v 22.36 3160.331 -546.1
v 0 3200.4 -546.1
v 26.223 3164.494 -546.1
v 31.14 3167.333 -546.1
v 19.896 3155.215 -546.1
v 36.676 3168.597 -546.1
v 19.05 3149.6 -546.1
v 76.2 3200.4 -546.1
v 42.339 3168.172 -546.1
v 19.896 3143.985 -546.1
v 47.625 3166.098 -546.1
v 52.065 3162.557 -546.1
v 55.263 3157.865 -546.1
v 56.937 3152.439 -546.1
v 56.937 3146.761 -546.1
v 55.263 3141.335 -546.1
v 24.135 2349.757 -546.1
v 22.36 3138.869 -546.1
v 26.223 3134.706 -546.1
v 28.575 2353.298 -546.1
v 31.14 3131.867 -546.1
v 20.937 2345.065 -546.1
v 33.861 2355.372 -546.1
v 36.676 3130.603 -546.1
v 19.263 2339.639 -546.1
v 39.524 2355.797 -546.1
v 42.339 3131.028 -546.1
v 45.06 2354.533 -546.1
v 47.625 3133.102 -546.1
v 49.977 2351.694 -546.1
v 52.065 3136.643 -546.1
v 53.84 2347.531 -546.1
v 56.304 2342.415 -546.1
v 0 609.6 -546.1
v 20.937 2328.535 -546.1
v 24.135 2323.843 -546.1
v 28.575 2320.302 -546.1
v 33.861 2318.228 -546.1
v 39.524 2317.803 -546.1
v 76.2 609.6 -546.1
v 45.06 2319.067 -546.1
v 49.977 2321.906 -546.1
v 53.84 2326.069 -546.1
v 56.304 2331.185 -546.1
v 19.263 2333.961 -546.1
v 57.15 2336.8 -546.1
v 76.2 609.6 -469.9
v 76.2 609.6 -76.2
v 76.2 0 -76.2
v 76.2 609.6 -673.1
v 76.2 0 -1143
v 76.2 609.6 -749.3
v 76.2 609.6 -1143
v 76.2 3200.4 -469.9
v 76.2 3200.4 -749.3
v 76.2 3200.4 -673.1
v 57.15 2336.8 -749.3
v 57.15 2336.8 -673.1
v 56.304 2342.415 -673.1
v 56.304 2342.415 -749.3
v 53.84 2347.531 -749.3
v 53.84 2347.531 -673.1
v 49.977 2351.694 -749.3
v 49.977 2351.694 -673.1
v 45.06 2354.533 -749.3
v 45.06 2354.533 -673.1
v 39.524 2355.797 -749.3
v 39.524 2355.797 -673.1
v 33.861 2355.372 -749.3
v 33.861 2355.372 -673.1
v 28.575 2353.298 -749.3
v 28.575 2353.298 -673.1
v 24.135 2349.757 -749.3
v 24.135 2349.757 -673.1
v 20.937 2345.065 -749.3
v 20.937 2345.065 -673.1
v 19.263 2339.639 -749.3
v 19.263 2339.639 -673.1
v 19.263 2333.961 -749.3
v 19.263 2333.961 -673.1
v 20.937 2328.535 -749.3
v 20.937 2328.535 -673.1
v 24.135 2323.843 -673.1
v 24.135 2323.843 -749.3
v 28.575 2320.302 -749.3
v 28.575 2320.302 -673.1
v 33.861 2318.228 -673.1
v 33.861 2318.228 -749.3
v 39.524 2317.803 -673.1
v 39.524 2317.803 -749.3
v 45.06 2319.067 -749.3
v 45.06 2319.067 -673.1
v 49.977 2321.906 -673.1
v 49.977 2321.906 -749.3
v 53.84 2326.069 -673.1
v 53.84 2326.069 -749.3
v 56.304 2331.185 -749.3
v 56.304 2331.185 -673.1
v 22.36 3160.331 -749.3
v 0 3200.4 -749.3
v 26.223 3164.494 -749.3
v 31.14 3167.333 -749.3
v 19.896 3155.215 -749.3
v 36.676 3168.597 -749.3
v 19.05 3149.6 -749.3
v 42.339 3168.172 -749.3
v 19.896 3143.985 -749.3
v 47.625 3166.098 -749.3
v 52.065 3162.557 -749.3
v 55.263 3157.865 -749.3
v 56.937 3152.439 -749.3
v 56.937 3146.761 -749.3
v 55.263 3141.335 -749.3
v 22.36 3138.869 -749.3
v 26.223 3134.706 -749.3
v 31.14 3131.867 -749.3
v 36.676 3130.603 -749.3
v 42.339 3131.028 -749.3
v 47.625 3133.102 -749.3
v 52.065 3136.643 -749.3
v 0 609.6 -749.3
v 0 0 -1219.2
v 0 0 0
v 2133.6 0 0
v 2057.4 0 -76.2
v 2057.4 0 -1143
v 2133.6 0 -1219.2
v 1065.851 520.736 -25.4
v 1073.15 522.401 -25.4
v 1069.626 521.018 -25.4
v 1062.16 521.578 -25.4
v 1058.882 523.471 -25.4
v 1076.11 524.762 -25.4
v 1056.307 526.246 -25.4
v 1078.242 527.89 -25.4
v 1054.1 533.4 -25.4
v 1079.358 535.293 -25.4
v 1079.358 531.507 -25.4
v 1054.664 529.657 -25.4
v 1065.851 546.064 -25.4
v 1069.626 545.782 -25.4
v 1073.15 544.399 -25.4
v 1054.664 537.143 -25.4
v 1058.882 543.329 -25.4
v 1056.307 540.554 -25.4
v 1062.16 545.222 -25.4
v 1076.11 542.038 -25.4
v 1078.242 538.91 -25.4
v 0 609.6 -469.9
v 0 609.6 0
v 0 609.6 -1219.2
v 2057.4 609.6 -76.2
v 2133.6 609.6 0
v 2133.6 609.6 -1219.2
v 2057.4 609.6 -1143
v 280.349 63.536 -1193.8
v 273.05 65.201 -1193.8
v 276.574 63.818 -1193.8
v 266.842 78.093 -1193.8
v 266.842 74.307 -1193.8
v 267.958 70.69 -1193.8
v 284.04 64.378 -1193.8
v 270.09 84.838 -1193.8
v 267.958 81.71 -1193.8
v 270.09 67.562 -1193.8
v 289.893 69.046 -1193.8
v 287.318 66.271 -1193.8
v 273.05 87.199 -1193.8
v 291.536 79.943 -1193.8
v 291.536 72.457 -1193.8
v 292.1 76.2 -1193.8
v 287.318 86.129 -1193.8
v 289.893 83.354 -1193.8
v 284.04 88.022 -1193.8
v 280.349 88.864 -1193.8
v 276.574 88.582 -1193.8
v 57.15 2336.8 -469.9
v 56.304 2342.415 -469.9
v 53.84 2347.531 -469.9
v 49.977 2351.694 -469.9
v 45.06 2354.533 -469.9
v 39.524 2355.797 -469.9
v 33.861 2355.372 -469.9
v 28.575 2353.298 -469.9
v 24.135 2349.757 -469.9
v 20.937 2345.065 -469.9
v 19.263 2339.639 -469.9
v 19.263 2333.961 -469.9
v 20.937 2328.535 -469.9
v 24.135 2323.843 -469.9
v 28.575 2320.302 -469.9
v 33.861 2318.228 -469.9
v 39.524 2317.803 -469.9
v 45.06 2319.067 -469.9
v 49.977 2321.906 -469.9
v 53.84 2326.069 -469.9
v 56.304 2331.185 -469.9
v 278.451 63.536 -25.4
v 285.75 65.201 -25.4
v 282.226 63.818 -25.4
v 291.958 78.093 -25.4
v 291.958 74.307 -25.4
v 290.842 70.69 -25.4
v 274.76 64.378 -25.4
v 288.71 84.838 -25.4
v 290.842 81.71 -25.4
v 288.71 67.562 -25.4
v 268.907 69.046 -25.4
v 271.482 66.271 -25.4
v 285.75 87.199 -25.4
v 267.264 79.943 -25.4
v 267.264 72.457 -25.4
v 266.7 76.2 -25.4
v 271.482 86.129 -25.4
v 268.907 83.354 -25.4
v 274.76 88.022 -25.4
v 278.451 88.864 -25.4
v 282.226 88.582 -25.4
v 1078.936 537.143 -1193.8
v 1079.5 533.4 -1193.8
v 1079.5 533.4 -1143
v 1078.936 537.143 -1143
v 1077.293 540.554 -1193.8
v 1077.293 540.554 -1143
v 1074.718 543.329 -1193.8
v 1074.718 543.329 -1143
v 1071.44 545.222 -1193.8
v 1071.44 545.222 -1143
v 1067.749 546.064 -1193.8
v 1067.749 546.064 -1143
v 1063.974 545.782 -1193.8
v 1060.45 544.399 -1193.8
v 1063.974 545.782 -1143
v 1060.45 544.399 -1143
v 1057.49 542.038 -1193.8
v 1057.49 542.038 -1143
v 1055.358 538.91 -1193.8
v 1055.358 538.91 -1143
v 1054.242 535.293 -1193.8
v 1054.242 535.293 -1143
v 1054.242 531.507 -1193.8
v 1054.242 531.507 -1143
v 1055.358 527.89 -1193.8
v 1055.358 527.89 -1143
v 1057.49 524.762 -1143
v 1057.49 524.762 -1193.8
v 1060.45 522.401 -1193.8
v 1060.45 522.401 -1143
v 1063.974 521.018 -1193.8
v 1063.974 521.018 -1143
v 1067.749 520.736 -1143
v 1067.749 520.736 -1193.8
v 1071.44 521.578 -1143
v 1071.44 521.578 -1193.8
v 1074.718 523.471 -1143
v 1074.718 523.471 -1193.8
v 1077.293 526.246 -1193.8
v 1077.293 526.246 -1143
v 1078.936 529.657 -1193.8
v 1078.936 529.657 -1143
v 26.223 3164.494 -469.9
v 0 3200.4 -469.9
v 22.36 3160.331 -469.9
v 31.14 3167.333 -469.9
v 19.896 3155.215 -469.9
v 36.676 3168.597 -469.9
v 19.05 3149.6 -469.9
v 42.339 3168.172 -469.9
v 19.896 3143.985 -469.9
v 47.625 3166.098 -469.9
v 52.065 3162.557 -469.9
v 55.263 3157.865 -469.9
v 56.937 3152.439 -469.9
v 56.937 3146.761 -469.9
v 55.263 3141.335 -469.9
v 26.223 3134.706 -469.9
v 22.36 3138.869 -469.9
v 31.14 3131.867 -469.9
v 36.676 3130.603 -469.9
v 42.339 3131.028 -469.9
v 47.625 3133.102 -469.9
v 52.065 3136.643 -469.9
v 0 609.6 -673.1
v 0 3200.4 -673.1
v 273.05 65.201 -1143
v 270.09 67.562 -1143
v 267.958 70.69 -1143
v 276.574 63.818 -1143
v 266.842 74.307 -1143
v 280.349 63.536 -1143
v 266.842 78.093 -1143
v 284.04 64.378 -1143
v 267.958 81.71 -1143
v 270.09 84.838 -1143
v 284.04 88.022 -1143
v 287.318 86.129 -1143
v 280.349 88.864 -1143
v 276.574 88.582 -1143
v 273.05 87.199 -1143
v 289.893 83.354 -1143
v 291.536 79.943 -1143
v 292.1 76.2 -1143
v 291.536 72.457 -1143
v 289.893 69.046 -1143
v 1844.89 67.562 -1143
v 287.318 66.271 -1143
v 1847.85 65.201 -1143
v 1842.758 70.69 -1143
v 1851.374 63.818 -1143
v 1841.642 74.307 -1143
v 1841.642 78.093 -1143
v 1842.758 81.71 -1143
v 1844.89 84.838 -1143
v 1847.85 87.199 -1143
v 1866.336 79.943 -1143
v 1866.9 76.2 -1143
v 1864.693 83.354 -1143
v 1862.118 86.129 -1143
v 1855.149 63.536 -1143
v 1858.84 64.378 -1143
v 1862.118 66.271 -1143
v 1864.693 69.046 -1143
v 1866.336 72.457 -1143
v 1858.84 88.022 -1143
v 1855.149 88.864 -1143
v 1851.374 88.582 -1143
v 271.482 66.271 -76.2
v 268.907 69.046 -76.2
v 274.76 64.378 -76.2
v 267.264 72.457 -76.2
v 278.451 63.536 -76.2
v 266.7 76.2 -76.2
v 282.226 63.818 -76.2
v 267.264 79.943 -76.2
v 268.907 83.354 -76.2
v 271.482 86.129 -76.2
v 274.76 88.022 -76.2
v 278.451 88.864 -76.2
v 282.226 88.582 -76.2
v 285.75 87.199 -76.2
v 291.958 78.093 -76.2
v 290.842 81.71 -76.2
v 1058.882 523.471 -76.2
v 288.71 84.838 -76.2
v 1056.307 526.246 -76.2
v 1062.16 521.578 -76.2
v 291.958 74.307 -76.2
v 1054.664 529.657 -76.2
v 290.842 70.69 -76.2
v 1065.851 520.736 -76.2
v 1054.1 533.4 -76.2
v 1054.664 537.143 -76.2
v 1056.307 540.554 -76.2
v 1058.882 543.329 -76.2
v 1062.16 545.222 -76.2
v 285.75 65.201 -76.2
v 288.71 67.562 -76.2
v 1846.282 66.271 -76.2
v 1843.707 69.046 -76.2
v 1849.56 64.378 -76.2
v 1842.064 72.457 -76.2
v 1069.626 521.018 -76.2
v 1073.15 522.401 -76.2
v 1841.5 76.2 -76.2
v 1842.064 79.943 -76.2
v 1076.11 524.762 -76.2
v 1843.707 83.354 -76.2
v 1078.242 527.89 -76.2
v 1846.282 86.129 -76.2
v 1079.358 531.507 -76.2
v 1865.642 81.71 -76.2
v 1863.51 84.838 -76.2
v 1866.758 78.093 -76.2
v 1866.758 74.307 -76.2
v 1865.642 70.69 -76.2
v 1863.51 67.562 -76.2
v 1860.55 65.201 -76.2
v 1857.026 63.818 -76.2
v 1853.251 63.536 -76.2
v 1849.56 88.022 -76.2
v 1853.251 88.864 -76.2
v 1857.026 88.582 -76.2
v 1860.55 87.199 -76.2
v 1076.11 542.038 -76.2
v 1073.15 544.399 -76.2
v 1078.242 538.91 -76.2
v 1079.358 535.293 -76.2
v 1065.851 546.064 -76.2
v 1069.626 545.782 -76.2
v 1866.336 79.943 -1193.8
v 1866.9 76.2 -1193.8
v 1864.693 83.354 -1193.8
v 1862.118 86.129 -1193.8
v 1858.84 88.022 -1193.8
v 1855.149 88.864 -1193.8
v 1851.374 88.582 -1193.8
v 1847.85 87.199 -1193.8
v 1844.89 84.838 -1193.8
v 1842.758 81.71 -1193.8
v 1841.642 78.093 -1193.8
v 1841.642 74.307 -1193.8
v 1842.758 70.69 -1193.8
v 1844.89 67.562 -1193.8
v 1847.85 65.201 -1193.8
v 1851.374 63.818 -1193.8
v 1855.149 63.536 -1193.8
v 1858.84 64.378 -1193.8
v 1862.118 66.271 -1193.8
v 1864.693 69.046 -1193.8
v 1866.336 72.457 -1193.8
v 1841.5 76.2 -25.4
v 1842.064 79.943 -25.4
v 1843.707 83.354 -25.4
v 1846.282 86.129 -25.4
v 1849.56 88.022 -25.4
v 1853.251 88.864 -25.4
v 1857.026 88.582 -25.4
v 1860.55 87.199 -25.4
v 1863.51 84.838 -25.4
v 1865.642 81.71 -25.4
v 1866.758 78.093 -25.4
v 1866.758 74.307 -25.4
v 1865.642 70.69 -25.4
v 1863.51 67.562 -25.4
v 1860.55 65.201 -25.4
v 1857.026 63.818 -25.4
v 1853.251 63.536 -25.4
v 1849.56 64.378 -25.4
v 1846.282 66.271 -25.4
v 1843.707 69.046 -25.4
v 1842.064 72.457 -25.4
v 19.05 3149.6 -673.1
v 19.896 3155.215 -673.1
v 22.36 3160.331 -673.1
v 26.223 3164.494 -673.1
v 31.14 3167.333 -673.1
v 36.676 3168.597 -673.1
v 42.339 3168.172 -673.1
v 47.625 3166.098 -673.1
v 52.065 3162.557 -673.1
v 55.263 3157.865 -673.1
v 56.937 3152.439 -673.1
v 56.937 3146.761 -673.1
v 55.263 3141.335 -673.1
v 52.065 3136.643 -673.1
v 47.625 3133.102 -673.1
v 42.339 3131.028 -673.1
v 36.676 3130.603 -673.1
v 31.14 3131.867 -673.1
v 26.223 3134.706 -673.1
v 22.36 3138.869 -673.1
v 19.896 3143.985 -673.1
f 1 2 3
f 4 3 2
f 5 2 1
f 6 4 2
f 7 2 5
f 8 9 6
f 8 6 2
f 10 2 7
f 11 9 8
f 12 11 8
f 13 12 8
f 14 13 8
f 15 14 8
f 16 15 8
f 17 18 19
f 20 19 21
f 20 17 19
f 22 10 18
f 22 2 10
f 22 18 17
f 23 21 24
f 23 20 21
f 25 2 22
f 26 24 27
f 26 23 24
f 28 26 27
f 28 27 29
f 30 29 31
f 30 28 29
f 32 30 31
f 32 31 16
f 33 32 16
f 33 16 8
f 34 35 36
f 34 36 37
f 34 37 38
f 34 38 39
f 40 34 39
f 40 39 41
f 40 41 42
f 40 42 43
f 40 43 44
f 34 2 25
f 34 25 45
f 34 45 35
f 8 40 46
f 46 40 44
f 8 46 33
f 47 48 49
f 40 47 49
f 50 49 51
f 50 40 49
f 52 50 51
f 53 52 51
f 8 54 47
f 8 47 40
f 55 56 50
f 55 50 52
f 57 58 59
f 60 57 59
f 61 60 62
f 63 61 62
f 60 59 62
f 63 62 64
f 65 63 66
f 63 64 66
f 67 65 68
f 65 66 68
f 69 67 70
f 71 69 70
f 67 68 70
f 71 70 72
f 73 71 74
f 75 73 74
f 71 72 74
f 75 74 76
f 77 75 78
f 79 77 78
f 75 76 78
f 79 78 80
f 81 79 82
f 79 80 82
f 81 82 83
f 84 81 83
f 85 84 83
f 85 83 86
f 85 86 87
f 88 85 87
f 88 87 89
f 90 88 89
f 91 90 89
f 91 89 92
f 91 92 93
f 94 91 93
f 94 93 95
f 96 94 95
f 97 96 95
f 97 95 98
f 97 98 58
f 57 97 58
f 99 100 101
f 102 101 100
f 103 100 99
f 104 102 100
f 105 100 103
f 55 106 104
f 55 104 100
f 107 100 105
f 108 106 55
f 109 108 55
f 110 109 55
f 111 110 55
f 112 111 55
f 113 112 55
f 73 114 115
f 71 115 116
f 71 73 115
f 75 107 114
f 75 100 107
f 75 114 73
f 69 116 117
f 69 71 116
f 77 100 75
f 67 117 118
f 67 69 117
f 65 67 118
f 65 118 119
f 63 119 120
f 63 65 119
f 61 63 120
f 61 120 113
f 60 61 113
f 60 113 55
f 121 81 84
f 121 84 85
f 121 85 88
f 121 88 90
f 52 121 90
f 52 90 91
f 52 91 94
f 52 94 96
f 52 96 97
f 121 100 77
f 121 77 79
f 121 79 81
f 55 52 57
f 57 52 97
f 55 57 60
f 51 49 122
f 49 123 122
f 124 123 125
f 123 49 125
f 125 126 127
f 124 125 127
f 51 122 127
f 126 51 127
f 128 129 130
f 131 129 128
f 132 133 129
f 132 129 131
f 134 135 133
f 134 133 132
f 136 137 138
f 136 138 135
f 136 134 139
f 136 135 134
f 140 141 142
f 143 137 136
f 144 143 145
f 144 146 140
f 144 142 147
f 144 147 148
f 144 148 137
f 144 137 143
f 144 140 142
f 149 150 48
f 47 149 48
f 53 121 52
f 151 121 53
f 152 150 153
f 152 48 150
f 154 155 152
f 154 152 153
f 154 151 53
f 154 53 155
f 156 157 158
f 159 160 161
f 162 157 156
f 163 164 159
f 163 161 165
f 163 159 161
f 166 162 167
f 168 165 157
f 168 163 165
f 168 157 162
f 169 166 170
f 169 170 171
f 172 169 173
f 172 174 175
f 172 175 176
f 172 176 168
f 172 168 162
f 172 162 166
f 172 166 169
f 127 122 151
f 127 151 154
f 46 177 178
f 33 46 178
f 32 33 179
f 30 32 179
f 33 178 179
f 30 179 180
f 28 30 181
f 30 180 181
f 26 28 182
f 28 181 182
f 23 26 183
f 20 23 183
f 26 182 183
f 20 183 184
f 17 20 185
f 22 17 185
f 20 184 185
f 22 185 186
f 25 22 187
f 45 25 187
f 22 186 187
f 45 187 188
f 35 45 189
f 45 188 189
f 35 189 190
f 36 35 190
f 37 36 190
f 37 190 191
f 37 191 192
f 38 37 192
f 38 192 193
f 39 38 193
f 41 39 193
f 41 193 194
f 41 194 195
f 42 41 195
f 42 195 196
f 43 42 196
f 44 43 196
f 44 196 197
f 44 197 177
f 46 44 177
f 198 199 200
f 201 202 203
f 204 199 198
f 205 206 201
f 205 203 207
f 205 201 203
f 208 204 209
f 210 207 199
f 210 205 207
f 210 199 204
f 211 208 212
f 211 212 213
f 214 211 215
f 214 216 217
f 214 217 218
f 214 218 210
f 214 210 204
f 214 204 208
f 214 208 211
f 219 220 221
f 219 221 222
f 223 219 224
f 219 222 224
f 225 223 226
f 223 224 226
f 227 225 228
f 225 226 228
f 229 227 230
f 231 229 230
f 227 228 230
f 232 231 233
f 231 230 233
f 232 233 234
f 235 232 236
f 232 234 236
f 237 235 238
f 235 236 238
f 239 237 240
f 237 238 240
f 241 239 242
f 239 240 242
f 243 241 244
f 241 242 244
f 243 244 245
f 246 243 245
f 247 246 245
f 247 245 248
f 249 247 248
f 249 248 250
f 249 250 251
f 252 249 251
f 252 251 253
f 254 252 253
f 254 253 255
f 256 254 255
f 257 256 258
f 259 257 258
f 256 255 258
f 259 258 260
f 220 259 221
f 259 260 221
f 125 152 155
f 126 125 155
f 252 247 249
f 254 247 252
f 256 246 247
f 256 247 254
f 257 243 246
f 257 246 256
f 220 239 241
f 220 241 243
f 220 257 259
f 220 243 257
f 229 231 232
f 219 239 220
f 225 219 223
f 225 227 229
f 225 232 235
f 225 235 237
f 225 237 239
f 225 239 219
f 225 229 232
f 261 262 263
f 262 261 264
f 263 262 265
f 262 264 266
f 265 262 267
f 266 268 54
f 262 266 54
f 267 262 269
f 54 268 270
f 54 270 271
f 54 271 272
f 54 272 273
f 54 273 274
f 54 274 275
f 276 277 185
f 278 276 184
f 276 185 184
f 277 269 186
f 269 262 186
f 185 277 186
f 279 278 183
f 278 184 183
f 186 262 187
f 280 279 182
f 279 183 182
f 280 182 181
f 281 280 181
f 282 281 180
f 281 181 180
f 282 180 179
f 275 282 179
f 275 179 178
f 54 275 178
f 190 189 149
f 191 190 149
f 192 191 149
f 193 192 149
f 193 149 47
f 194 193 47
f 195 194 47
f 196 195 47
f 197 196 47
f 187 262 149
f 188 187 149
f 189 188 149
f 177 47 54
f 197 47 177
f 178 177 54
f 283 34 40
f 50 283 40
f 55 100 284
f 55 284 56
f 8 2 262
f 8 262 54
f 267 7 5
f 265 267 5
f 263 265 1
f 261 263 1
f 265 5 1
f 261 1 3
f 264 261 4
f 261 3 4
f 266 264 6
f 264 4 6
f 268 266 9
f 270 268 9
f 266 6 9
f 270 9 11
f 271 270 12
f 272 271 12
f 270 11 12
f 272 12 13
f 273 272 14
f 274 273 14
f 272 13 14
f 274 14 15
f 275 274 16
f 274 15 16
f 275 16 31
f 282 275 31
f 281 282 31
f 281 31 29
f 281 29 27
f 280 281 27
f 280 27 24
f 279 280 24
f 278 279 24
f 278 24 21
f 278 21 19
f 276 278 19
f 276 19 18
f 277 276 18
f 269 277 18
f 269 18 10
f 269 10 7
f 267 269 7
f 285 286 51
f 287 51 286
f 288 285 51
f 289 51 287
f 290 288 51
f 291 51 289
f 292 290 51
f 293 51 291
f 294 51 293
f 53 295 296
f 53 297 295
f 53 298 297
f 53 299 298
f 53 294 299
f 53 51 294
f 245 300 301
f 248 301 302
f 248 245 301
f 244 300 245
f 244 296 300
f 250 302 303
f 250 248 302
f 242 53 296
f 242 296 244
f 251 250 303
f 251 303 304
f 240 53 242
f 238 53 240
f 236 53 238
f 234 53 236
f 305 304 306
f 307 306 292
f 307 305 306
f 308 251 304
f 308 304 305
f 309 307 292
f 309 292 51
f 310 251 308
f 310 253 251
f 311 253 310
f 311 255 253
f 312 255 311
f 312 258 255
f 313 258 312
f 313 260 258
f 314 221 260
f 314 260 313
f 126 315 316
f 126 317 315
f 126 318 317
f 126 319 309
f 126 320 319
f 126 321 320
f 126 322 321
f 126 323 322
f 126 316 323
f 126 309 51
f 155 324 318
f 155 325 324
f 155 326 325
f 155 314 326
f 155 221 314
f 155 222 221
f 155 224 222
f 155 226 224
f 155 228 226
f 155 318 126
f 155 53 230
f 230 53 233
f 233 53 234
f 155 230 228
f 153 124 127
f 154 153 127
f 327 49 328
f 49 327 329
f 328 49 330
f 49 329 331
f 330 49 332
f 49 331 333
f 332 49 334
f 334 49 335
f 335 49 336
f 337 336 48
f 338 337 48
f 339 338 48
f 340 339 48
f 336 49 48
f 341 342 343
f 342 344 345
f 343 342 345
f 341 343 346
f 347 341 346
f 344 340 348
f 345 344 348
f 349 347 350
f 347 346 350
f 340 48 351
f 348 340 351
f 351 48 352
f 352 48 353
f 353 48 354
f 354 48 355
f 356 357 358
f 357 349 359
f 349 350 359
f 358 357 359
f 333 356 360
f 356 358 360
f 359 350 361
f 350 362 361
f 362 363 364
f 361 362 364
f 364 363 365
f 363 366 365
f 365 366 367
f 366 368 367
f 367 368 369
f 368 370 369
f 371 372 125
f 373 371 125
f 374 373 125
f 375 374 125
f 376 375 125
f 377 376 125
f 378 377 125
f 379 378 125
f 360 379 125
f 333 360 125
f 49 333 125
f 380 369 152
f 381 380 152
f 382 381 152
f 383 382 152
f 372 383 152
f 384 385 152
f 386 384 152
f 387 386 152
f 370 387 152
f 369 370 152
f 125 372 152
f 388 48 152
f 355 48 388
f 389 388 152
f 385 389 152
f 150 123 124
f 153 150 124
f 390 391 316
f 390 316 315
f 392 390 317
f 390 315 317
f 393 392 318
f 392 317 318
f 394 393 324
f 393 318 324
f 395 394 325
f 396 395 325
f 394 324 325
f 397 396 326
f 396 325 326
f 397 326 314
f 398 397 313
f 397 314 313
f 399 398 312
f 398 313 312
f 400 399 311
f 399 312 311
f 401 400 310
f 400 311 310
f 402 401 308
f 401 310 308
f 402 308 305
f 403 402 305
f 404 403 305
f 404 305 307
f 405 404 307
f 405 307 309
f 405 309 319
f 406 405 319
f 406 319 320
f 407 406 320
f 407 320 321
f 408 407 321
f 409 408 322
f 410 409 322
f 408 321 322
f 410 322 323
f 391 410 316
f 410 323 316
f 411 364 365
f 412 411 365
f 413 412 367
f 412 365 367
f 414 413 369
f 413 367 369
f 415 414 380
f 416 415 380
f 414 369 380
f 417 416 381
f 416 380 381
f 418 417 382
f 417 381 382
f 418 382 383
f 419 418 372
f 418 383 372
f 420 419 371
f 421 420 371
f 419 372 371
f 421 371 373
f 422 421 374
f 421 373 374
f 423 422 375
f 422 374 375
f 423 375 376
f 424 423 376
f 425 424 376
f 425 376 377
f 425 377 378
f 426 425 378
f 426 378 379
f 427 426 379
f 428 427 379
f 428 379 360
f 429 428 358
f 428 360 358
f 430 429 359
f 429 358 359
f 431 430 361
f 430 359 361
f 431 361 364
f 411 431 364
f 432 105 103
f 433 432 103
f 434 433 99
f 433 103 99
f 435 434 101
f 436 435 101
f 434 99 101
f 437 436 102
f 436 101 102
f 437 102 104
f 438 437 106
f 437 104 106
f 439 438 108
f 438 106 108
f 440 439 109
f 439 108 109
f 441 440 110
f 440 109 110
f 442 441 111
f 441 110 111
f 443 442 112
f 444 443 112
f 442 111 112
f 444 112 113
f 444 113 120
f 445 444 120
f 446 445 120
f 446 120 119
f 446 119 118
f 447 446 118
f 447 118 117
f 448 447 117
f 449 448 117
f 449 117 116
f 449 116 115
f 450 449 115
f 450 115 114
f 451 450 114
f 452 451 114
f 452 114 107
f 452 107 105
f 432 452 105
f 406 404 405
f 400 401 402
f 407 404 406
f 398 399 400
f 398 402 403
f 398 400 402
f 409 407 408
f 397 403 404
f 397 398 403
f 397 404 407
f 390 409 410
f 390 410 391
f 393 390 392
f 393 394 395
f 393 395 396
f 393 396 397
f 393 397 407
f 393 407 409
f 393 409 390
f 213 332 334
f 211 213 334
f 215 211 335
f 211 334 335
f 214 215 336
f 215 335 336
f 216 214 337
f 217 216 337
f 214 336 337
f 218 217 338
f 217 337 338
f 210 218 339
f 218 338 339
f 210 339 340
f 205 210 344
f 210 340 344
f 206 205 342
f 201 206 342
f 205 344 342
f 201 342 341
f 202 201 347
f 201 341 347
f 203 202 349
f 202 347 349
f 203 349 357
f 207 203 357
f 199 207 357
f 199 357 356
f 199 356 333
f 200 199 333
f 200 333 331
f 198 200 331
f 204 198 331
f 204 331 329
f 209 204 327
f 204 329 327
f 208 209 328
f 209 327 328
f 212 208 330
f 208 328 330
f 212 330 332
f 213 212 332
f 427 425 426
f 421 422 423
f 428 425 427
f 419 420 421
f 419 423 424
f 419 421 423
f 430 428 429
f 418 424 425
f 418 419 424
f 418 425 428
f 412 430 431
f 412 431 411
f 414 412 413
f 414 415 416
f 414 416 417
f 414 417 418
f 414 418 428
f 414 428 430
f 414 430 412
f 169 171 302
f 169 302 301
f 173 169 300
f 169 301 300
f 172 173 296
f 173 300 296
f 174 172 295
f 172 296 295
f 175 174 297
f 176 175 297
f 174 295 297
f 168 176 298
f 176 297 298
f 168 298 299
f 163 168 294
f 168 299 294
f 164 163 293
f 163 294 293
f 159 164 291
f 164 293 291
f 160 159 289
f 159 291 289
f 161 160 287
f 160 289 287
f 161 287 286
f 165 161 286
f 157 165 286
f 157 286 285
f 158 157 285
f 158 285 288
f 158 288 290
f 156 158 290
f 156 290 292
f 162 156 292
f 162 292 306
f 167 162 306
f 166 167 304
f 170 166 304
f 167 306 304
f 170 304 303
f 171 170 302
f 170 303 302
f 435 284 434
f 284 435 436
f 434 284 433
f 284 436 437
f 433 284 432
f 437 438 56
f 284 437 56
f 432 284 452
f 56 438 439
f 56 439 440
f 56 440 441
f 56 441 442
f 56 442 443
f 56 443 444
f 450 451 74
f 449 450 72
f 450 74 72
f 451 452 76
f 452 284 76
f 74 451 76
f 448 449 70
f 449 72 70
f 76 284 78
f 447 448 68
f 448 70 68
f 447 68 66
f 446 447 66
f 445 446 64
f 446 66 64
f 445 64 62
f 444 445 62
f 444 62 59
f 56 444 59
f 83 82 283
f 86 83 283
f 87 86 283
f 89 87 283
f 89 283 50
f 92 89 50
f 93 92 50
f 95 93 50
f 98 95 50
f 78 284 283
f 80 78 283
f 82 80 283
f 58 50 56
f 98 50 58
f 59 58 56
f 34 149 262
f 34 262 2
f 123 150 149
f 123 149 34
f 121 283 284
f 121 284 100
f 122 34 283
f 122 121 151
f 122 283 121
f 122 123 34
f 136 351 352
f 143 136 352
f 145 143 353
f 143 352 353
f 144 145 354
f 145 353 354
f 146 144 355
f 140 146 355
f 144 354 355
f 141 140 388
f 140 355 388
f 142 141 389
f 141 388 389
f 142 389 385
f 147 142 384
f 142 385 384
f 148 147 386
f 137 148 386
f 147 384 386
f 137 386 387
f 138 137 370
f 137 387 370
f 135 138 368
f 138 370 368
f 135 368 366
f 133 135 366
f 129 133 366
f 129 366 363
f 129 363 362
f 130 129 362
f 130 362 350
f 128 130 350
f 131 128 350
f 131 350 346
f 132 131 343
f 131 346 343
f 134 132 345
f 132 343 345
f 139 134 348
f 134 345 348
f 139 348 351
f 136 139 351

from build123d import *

# Parameters (mm, degrees)
SKETCH1_W           = 2133.6
SKETCH1_H           = 1219.2
BOSS_EXTRUDE1_DEPTH = 609.6
SKETCH2_W           = 1981.2
SKETCH2_H           = 1066.8
CUT_EXTRUDE1_DEPTH  = 609.6
SKETCH5_R           = 12.7
CUT_EXTRUDE2_DEPTH  = 50.8
SKETCH6_R           = 12.7
CUT_EXTRUDE3_DEPTH  = 50.8
SKETCH7_R           = 12.7
BOSS_EXTRUDE2_DEPTH = 50.8
SKETCH8_R           = 12.7
CUT_EXTRUDE4_DEPTH  = 50.8
SKETCH10_R          = 12.7
CUT_EXTRUDE5_DEPTH  = 50.8
SKETCH11_W          = 76.2
SKETCH11_H          = 76.2
BOSS_EXTRUDE3_DEPTH = 2590.8
SKETCH12_R          = 19.05
CUT_EXTRUDE6_DEPTH  = 2590.8
SKETCH13_R          = 19.05
CUT_EXTRUDE7_DEPTH  = 1524


with BuildPart() as part:
    # Sketch1 → Boss-Extrude1 (new body)
    with BuildSketch(Plane(origin=(0, 0, 0), x_dir=(1, 0, 0), z_dir=(0, 1, 0))):
        with Locations((1066.8, 609.6)):
            Rectangle(SKETCH1_W, SKETCH1_H)
    extrude(amount=BOSS_EXTRUDE1_DEPTH)

    # Sketch2 → Cut-Extrude1 (cut)
    with BuildSketch(Plane(origin=(0, 609.6, 0), x_dir=(1, 0, 0), z_dir=(0, 1, 0))):
        with Locations((1066.8, 609.6)):
            Rectangle(SKETCH2_W, SKETCH2_H)
    extrude(amount=-CUT_EXTRUDE1_DEPTH, mode=Mode.SUBTRACT)

    # Sketch5 → Cut-Extrude2 (cut)
    with BuildSketch(Plane(origin=(0, 0, -76.2), x_dir=(-1, 0, 0), z_dir=(0, 0, -1))):
        with Locations((-279.4, 76.2)):
            Circle(SKETCH5_R)
        with Locations((-1854.2, 76.2)):
            Circle(SKETCH5_R)
    extrude(amount=-CUT_EXTRUDE2_DEPTH, mode=Mode.SUBTRACT)

    # Sketch6 → Cut-Extrude3 (cut)
    with BuildSketch(Plane.XY.offset(-1143)):
        with Locations((1854.2, 76.2)):
            Circle(SKETCH6_R)
        with Locations((279.4, 76.2)):
            Circle(SKETCH6_R)
    extrude(amount=-CUT_EXTRUDE3_DEPTH, mode=Mode.SUBTRACT)

    # Sketch7 → Boss-Extrude2 (add)
    with BuildSketch(Plane.XY.offset(-1143)):
        with Locations((1066.8, 508)):
            Circle(SKETCH7_R)
    extrude(amount=-BOSS_EXTRUDE2_DEPTH)

    # Sketch8 → Cut-Extrude4 (cut)
    with BuildSketch(Plane(origin=(0, 0, -76.2), x_dir=(-1, 0, 0), z_dir=(0, 0, -1))):
        with Locations((-1066.8, 533.4)):
            Circle(SKETCH8_R)
    extrude(amount=-CUT_EXTRUDE4_DEPTH, mode=Mode.SUBTRACT)

    # Sketch10 → Cut-Extrude5 (cut)
    with BuildSketch(Plane.XY.offset(-1143)):
        with Locations((1066.8, 533.4)):
            Circle(SKETCH10_R)
    extrude(amount=-CUT_EXTRUDE5_DEPTH, mode=Mode.SUBTRACT)

    # Sketch11 → Boss-Extrude3 (add)
    with BuildSketch(Plane(origin=(0, 609.6, 0), x_dir=(1, 0, 0), z_dir=(0, 1, 0))):
        with Locations((38.1, 711.2)):
            Rectangle(SKETCH11_W, SKETCH11_H)
        with Locations((38.1, 508)):
            Rectangle(SKETCH11_W, SKETCH11_H)
    extrude(amount=BOSS_EXTRUDE3_DEPTH)

    # Sketch12 → Cut-Extrude6 (cut)
    with BuildSketch(Plane.XY.offset(-469.9)):
        with Locations((38.1, 2336.8)):
            Circle(SKETCH12_R)
    extrude(amount=-CUT_EXTRUDE6_DEPTH, mode=Mode.SUBTRACT)

    # Sketch13 → Cut-Extrude7 (cut)
    with BuildSketch(Plane(origin=(0, 0, -749.3), x_dir=(-1, 0, 0), z_dir=(0, 0, -1))):
        with Locations((-38.1, 3149.6)):
            Circle(SKETCH13_R)
    extrude(amount=-CUT_EXTRUDE7_DEPTH, mode=Mode.SUBTRACT)


solid = part.part
